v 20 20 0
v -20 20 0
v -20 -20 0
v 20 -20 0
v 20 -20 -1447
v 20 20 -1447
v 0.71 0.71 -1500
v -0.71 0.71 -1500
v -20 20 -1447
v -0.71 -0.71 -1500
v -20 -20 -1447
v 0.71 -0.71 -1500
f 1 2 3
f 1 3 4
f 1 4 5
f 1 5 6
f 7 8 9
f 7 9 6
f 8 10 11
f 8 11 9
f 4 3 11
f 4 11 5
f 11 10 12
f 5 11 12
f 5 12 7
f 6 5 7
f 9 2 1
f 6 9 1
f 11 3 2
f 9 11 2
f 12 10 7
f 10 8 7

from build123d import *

# Parameters (mm, degrees)
F0_W     = 40
F0_H     = 40
F1_DEPTH = 1500
F2_SIZE2 = 19.290422
F2_SIZE  = 53


with BuildPart() as f1:
    # F0 (on Top) → F1 (new body)
    with BuildSketch(Plane.XY):
        Rectangle(F0_W, F0_H)
    extrude(amount=-F1_DEPTH)

    # F2
    f2_edges = [f1.edges().sort_by_distance(p)[0] for p in [
        (0, -20, -1500),
        (20, 0, -1500),
        (0, 20, -1500),
        (-20, 0, -1500),
    ]]
    chamfer(f2_edges, length=F2_SIZE, length2=F2_SIZE2)


solid = f1.part
